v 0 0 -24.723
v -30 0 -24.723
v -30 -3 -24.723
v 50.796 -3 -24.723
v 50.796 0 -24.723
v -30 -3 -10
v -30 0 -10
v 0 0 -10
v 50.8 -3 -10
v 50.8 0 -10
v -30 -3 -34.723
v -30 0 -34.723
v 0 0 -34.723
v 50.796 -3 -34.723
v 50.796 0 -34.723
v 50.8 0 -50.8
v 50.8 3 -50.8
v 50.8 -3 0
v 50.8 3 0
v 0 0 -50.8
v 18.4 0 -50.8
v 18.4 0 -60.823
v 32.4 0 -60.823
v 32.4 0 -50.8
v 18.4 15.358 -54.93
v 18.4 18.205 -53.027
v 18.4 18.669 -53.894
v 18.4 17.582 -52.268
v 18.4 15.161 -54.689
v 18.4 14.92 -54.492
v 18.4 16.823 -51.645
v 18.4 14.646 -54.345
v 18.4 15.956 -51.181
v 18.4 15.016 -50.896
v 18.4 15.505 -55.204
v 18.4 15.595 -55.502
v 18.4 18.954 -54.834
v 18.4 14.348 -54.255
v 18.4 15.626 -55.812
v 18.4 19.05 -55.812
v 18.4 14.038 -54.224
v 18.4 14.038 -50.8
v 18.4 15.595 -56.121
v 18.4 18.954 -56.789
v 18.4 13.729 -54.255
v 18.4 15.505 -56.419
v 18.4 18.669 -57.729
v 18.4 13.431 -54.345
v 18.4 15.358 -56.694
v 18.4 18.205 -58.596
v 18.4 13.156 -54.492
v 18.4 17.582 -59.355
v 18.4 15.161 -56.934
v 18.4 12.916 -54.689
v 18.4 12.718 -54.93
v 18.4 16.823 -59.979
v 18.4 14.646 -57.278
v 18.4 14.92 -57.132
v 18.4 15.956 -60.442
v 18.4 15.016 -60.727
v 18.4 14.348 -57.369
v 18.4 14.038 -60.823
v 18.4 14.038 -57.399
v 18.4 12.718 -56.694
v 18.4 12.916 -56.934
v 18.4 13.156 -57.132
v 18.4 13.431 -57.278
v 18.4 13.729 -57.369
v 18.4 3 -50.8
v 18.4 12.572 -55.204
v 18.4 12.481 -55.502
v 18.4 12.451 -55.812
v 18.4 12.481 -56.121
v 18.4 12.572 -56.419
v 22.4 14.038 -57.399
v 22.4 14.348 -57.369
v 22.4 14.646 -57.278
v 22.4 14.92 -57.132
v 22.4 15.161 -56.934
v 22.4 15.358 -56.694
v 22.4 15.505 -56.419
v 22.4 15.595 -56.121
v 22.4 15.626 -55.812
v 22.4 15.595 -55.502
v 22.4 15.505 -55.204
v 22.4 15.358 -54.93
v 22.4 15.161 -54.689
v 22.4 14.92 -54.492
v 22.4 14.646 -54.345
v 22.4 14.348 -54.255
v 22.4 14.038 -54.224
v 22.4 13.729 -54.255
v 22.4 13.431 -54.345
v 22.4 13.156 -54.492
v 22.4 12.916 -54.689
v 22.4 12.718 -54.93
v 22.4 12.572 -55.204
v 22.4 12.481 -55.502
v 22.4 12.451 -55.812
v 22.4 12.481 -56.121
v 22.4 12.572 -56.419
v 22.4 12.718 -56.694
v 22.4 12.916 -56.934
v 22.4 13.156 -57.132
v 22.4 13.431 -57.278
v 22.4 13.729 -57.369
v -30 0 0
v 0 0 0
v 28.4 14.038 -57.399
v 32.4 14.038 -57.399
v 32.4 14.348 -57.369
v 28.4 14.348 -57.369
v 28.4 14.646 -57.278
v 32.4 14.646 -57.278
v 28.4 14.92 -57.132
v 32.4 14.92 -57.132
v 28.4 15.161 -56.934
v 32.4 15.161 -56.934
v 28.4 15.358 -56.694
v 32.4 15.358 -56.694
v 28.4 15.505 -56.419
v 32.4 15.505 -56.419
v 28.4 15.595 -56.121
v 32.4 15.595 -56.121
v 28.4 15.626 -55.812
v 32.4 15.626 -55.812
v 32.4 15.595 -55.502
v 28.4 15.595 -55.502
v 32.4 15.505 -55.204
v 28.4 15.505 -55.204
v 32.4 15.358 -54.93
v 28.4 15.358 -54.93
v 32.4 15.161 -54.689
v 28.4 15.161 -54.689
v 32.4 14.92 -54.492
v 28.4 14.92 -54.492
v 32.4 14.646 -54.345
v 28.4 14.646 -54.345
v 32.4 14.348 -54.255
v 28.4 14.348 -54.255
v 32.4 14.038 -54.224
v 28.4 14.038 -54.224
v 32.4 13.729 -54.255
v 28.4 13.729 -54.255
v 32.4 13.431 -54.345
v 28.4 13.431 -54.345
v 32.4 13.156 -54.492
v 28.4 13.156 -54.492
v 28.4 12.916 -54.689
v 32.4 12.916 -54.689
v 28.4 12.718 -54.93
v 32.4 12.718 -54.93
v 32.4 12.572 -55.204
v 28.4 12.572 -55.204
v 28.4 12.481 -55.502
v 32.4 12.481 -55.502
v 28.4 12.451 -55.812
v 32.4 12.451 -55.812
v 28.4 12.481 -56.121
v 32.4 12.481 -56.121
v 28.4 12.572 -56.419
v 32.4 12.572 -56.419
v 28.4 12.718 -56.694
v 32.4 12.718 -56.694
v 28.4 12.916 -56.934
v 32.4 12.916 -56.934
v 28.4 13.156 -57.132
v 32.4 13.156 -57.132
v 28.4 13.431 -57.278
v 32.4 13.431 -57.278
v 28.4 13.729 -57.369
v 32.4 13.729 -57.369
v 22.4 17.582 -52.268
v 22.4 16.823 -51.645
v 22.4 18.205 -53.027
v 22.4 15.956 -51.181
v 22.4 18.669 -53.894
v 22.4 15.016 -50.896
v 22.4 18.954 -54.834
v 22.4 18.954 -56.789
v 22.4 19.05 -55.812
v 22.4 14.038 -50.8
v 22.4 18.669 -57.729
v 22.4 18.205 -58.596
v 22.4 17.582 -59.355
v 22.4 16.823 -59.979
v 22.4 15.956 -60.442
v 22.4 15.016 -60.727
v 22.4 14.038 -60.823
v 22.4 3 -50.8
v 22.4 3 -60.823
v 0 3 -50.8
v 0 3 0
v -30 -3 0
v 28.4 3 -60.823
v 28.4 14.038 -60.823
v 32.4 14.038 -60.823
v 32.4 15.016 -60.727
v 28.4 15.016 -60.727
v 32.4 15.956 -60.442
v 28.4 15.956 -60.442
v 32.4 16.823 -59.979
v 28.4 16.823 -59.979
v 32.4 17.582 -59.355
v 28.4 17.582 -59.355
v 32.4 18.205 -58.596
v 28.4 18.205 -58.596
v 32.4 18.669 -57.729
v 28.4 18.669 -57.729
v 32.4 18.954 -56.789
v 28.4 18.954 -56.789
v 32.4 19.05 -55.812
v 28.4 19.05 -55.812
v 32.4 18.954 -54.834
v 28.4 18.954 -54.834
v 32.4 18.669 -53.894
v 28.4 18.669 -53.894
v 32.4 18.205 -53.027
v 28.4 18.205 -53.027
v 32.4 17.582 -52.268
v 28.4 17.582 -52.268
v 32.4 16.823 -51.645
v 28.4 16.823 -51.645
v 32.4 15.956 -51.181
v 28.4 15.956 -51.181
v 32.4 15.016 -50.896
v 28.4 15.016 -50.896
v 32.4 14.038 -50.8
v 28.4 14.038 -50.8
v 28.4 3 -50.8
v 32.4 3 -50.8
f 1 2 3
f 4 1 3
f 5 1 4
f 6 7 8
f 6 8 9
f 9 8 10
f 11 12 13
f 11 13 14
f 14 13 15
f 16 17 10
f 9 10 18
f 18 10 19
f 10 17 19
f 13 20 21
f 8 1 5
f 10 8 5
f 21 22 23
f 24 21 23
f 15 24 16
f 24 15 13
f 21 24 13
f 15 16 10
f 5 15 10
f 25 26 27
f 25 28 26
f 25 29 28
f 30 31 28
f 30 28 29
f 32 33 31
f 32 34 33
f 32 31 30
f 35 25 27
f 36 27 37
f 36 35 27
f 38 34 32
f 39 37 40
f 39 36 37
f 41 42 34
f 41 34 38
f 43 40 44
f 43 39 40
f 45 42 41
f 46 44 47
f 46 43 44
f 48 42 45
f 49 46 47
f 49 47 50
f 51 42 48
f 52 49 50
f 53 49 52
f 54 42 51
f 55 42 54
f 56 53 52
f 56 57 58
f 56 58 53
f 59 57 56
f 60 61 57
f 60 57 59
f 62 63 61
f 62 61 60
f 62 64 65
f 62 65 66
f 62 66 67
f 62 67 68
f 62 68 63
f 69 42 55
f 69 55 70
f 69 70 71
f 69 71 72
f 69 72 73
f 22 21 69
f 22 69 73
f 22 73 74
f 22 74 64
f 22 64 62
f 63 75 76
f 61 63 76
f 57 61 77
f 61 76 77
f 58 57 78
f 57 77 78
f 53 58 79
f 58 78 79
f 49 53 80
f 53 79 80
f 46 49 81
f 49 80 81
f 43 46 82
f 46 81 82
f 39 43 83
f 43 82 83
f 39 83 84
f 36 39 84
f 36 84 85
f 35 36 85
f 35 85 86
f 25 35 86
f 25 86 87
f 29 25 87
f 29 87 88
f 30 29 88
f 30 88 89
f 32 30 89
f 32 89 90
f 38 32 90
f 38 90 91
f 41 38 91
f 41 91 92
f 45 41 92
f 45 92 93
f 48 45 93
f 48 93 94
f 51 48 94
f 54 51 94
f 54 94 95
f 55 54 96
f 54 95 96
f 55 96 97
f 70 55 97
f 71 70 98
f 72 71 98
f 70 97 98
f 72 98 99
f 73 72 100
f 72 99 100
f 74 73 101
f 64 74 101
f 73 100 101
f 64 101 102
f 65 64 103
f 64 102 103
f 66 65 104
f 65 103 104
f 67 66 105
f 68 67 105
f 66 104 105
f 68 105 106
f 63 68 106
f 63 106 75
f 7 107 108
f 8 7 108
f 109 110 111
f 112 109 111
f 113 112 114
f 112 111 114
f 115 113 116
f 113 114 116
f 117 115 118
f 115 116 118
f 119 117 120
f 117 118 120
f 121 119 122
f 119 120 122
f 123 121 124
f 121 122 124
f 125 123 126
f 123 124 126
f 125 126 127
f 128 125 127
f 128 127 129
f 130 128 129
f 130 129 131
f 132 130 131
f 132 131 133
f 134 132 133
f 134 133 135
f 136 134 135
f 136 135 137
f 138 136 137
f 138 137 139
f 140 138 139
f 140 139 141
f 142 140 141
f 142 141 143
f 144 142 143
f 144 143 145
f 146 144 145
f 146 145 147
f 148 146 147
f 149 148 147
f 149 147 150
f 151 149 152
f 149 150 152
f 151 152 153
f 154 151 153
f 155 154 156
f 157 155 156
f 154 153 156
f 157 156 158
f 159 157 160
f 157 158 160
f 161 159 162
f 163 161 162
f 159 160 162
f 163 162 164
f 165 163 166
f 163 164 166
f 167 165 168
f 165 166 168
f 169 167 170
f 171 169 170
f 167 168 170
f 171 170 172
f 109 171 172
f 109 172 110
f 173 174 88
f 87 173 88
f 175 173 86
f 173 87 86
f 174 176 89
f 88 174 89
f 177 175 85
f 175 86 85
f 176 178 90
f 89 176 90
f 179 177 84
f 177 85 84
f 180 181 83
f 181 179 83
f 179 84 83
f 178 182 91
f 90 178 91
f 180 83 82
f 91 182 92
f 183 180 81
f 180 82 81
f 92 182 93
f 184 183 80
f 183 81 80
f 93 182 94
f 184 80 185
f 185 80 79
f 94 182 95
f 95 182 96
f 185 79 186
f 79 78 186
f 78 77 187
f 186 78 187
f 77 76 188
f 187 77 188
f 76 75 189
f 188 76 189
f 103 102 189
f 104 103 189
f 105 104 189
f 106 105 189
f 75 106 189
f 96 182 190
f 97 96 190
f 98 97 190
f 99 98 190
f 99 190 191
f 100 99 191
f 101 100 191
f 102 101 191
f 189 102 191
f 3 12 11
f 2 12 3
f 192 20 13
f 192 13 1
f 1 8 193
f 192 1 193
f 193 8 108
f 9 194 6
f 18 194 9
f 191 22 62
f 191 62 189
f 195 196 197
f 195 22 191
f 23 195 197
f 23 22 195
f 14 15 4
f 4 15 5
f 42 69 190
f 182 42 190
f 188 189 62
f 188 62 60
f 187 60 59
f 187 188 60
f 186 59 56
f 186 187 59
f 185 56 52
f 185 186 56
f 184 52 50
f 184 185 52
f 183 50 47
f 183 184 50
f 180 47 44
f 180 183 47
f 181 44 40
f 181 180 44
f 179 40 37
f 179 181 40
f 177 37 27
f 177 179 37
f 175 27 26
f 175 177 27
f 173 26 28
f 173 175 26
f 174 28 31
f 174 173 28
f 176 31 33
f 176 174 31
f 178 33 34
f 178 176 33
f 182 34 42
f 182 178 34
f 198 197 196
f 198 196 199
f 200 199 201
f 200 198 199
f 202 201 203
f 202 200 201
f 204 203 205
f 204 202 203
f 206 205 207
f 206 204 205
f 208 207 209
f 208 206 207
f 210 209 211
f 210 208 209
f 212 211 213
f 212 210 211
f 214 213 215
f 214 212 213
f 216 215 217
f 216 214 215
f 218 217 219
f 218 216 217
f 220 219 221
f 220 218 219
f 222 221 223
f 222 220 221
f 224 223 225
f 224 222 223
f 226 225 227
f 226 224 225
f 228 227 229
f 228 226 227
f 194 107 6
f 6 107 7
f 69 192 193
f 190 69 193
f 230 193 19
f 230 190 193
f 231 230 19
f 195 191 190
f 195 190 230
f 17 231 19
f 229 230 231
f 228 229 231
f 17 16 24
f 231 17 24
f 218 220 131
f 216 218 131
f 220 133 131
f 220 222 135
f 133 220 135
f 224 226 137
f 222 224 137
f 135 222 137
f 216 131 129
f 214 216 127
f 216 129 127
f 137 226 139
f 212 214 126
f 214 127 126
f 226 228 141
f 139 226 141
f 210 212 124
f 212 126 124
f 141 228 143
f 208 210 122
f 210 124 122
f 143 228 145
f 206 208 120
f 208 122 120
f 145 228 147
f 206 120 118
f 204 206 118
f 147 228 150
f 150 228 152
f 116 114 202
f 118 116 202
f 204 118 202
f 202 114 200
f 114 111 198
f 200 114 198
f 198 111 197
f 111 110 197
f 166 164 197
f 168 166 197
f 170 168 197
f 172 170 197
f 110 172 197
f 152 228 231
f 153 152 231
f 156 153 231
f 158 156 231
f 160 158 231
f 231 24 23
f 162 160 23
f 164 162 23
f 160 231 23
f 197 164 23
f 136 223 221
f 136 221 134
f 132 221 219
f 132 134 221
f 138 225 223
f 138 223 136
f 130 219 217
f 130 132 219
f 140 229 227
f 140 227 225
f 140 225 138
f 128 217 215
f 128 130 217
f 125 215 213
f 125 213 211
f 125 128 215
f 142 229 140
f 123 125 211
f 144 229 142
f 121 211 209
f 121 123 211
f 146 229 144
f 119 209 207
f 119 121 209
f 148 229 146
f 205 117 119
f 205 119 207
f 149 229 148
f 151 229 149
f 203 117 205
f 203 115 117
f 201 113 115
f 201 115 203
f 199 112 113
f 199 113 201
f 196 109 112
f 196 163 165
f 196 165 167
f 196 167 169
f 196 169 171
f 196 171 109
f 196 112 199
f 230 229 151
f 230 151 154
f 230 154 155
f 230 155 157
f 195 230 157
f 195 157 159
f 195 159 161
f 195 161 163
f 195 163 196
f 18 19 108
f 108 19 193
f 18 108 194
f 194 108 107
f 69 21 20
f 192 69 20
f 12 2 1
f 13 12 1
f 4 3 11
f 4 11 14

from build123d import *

# Parameters (mm, degrees)
BOSS_EXTRUDE1_DEPTH = 3
SKETCH1_3_W         = 4
SKETCH1_3_H         = 10.023203152
BOSS_EXTRUDE2_DEPTH = 19.05
SKETCH2_R           = 1.5875
CUT_EXTRUDE1_DEPTH  = 19.05
SKETCH3_W           = 80.796379589
SKETCH3_H           = 10
BOSS_EXTRUDE3_DEPTH = 3


with BuildPart() as part:
    # Sketch1 → Boss-Extrude1 (new body)
    with BuildSketch(Plane(origin=(0, 0, 0), x_dir=(1, 0, 0), z_dir=(0, 1, 0))):
        Polygon((0, 50.8), (0, 0), (50.8, 0), (50.8, 50.8), (28.4, 50.8), (28.4, 60.823203152), (22.4, 60.823203152), (22.4, 50.8), align=None)
    extrude(amount=BOSS_EXTRUDE1_DEPTH)

    # Sketch1<3> → Boss-Extrude2 (add)
    with BuildSketch(Plane(origin=(0, 0, 0), x_dir=(1, 0, 0), z_dir=(0, 1, 0))):
        with Locations((20.4, 55.811601576)):
            Rectangle(SKETCH1_3_W, SKETCH1_3_H)
        with Locations((30.4, 55.811601576)):
            Rectangle(SKETCH1_3_W, SKETCH1_3_H)
    extrude(amount=BOSS_EXTRUDE2_DEPTH)

    # Sketch2 → Cut-Extrude1 (cut)
    with BuildSketch(Plane(origin=(32.4, 0, 0), x_dir=(0, 0, -1), z_dir=(1, 0, 0))):
        with Locations((55.811601576, 14.038398424)):
            Circle(SKETCH2_R)
        with BuildLine():
            Line((50.8, 14.038398424), (49.911458456, 20.395059664))
            Line((49.911458456, 20.395059664), (64.501767063, 21.247740037))
            Line((64.501767063, 21.247740037), (60.823203152, 14.038398424))
            ThreePointArc((60.823203152, 14.038398424), (55.811601576, 19.05), (50.8, 14.038398424))
        make_face()
    extrude(amount=-CUT_EXTRUDE1_DEPTH, mode=Mode.SUBTRACT)

    # Sketch3 → Boss-Extrude3 (add)
    with BuildSketch(Plane.XZ):
        Polygon((0, 0), (-30, 0), (-30, -10), (50.8, -10), (50.8, 0), align=None)
        with Locations((10.398189795, -29.723216131)):
            Rectangle(SKETCH3_W, SKETCH3_H)
    extrude(amount=BOSS_EXTRUDE3_DEPTH)


solid = part.part
